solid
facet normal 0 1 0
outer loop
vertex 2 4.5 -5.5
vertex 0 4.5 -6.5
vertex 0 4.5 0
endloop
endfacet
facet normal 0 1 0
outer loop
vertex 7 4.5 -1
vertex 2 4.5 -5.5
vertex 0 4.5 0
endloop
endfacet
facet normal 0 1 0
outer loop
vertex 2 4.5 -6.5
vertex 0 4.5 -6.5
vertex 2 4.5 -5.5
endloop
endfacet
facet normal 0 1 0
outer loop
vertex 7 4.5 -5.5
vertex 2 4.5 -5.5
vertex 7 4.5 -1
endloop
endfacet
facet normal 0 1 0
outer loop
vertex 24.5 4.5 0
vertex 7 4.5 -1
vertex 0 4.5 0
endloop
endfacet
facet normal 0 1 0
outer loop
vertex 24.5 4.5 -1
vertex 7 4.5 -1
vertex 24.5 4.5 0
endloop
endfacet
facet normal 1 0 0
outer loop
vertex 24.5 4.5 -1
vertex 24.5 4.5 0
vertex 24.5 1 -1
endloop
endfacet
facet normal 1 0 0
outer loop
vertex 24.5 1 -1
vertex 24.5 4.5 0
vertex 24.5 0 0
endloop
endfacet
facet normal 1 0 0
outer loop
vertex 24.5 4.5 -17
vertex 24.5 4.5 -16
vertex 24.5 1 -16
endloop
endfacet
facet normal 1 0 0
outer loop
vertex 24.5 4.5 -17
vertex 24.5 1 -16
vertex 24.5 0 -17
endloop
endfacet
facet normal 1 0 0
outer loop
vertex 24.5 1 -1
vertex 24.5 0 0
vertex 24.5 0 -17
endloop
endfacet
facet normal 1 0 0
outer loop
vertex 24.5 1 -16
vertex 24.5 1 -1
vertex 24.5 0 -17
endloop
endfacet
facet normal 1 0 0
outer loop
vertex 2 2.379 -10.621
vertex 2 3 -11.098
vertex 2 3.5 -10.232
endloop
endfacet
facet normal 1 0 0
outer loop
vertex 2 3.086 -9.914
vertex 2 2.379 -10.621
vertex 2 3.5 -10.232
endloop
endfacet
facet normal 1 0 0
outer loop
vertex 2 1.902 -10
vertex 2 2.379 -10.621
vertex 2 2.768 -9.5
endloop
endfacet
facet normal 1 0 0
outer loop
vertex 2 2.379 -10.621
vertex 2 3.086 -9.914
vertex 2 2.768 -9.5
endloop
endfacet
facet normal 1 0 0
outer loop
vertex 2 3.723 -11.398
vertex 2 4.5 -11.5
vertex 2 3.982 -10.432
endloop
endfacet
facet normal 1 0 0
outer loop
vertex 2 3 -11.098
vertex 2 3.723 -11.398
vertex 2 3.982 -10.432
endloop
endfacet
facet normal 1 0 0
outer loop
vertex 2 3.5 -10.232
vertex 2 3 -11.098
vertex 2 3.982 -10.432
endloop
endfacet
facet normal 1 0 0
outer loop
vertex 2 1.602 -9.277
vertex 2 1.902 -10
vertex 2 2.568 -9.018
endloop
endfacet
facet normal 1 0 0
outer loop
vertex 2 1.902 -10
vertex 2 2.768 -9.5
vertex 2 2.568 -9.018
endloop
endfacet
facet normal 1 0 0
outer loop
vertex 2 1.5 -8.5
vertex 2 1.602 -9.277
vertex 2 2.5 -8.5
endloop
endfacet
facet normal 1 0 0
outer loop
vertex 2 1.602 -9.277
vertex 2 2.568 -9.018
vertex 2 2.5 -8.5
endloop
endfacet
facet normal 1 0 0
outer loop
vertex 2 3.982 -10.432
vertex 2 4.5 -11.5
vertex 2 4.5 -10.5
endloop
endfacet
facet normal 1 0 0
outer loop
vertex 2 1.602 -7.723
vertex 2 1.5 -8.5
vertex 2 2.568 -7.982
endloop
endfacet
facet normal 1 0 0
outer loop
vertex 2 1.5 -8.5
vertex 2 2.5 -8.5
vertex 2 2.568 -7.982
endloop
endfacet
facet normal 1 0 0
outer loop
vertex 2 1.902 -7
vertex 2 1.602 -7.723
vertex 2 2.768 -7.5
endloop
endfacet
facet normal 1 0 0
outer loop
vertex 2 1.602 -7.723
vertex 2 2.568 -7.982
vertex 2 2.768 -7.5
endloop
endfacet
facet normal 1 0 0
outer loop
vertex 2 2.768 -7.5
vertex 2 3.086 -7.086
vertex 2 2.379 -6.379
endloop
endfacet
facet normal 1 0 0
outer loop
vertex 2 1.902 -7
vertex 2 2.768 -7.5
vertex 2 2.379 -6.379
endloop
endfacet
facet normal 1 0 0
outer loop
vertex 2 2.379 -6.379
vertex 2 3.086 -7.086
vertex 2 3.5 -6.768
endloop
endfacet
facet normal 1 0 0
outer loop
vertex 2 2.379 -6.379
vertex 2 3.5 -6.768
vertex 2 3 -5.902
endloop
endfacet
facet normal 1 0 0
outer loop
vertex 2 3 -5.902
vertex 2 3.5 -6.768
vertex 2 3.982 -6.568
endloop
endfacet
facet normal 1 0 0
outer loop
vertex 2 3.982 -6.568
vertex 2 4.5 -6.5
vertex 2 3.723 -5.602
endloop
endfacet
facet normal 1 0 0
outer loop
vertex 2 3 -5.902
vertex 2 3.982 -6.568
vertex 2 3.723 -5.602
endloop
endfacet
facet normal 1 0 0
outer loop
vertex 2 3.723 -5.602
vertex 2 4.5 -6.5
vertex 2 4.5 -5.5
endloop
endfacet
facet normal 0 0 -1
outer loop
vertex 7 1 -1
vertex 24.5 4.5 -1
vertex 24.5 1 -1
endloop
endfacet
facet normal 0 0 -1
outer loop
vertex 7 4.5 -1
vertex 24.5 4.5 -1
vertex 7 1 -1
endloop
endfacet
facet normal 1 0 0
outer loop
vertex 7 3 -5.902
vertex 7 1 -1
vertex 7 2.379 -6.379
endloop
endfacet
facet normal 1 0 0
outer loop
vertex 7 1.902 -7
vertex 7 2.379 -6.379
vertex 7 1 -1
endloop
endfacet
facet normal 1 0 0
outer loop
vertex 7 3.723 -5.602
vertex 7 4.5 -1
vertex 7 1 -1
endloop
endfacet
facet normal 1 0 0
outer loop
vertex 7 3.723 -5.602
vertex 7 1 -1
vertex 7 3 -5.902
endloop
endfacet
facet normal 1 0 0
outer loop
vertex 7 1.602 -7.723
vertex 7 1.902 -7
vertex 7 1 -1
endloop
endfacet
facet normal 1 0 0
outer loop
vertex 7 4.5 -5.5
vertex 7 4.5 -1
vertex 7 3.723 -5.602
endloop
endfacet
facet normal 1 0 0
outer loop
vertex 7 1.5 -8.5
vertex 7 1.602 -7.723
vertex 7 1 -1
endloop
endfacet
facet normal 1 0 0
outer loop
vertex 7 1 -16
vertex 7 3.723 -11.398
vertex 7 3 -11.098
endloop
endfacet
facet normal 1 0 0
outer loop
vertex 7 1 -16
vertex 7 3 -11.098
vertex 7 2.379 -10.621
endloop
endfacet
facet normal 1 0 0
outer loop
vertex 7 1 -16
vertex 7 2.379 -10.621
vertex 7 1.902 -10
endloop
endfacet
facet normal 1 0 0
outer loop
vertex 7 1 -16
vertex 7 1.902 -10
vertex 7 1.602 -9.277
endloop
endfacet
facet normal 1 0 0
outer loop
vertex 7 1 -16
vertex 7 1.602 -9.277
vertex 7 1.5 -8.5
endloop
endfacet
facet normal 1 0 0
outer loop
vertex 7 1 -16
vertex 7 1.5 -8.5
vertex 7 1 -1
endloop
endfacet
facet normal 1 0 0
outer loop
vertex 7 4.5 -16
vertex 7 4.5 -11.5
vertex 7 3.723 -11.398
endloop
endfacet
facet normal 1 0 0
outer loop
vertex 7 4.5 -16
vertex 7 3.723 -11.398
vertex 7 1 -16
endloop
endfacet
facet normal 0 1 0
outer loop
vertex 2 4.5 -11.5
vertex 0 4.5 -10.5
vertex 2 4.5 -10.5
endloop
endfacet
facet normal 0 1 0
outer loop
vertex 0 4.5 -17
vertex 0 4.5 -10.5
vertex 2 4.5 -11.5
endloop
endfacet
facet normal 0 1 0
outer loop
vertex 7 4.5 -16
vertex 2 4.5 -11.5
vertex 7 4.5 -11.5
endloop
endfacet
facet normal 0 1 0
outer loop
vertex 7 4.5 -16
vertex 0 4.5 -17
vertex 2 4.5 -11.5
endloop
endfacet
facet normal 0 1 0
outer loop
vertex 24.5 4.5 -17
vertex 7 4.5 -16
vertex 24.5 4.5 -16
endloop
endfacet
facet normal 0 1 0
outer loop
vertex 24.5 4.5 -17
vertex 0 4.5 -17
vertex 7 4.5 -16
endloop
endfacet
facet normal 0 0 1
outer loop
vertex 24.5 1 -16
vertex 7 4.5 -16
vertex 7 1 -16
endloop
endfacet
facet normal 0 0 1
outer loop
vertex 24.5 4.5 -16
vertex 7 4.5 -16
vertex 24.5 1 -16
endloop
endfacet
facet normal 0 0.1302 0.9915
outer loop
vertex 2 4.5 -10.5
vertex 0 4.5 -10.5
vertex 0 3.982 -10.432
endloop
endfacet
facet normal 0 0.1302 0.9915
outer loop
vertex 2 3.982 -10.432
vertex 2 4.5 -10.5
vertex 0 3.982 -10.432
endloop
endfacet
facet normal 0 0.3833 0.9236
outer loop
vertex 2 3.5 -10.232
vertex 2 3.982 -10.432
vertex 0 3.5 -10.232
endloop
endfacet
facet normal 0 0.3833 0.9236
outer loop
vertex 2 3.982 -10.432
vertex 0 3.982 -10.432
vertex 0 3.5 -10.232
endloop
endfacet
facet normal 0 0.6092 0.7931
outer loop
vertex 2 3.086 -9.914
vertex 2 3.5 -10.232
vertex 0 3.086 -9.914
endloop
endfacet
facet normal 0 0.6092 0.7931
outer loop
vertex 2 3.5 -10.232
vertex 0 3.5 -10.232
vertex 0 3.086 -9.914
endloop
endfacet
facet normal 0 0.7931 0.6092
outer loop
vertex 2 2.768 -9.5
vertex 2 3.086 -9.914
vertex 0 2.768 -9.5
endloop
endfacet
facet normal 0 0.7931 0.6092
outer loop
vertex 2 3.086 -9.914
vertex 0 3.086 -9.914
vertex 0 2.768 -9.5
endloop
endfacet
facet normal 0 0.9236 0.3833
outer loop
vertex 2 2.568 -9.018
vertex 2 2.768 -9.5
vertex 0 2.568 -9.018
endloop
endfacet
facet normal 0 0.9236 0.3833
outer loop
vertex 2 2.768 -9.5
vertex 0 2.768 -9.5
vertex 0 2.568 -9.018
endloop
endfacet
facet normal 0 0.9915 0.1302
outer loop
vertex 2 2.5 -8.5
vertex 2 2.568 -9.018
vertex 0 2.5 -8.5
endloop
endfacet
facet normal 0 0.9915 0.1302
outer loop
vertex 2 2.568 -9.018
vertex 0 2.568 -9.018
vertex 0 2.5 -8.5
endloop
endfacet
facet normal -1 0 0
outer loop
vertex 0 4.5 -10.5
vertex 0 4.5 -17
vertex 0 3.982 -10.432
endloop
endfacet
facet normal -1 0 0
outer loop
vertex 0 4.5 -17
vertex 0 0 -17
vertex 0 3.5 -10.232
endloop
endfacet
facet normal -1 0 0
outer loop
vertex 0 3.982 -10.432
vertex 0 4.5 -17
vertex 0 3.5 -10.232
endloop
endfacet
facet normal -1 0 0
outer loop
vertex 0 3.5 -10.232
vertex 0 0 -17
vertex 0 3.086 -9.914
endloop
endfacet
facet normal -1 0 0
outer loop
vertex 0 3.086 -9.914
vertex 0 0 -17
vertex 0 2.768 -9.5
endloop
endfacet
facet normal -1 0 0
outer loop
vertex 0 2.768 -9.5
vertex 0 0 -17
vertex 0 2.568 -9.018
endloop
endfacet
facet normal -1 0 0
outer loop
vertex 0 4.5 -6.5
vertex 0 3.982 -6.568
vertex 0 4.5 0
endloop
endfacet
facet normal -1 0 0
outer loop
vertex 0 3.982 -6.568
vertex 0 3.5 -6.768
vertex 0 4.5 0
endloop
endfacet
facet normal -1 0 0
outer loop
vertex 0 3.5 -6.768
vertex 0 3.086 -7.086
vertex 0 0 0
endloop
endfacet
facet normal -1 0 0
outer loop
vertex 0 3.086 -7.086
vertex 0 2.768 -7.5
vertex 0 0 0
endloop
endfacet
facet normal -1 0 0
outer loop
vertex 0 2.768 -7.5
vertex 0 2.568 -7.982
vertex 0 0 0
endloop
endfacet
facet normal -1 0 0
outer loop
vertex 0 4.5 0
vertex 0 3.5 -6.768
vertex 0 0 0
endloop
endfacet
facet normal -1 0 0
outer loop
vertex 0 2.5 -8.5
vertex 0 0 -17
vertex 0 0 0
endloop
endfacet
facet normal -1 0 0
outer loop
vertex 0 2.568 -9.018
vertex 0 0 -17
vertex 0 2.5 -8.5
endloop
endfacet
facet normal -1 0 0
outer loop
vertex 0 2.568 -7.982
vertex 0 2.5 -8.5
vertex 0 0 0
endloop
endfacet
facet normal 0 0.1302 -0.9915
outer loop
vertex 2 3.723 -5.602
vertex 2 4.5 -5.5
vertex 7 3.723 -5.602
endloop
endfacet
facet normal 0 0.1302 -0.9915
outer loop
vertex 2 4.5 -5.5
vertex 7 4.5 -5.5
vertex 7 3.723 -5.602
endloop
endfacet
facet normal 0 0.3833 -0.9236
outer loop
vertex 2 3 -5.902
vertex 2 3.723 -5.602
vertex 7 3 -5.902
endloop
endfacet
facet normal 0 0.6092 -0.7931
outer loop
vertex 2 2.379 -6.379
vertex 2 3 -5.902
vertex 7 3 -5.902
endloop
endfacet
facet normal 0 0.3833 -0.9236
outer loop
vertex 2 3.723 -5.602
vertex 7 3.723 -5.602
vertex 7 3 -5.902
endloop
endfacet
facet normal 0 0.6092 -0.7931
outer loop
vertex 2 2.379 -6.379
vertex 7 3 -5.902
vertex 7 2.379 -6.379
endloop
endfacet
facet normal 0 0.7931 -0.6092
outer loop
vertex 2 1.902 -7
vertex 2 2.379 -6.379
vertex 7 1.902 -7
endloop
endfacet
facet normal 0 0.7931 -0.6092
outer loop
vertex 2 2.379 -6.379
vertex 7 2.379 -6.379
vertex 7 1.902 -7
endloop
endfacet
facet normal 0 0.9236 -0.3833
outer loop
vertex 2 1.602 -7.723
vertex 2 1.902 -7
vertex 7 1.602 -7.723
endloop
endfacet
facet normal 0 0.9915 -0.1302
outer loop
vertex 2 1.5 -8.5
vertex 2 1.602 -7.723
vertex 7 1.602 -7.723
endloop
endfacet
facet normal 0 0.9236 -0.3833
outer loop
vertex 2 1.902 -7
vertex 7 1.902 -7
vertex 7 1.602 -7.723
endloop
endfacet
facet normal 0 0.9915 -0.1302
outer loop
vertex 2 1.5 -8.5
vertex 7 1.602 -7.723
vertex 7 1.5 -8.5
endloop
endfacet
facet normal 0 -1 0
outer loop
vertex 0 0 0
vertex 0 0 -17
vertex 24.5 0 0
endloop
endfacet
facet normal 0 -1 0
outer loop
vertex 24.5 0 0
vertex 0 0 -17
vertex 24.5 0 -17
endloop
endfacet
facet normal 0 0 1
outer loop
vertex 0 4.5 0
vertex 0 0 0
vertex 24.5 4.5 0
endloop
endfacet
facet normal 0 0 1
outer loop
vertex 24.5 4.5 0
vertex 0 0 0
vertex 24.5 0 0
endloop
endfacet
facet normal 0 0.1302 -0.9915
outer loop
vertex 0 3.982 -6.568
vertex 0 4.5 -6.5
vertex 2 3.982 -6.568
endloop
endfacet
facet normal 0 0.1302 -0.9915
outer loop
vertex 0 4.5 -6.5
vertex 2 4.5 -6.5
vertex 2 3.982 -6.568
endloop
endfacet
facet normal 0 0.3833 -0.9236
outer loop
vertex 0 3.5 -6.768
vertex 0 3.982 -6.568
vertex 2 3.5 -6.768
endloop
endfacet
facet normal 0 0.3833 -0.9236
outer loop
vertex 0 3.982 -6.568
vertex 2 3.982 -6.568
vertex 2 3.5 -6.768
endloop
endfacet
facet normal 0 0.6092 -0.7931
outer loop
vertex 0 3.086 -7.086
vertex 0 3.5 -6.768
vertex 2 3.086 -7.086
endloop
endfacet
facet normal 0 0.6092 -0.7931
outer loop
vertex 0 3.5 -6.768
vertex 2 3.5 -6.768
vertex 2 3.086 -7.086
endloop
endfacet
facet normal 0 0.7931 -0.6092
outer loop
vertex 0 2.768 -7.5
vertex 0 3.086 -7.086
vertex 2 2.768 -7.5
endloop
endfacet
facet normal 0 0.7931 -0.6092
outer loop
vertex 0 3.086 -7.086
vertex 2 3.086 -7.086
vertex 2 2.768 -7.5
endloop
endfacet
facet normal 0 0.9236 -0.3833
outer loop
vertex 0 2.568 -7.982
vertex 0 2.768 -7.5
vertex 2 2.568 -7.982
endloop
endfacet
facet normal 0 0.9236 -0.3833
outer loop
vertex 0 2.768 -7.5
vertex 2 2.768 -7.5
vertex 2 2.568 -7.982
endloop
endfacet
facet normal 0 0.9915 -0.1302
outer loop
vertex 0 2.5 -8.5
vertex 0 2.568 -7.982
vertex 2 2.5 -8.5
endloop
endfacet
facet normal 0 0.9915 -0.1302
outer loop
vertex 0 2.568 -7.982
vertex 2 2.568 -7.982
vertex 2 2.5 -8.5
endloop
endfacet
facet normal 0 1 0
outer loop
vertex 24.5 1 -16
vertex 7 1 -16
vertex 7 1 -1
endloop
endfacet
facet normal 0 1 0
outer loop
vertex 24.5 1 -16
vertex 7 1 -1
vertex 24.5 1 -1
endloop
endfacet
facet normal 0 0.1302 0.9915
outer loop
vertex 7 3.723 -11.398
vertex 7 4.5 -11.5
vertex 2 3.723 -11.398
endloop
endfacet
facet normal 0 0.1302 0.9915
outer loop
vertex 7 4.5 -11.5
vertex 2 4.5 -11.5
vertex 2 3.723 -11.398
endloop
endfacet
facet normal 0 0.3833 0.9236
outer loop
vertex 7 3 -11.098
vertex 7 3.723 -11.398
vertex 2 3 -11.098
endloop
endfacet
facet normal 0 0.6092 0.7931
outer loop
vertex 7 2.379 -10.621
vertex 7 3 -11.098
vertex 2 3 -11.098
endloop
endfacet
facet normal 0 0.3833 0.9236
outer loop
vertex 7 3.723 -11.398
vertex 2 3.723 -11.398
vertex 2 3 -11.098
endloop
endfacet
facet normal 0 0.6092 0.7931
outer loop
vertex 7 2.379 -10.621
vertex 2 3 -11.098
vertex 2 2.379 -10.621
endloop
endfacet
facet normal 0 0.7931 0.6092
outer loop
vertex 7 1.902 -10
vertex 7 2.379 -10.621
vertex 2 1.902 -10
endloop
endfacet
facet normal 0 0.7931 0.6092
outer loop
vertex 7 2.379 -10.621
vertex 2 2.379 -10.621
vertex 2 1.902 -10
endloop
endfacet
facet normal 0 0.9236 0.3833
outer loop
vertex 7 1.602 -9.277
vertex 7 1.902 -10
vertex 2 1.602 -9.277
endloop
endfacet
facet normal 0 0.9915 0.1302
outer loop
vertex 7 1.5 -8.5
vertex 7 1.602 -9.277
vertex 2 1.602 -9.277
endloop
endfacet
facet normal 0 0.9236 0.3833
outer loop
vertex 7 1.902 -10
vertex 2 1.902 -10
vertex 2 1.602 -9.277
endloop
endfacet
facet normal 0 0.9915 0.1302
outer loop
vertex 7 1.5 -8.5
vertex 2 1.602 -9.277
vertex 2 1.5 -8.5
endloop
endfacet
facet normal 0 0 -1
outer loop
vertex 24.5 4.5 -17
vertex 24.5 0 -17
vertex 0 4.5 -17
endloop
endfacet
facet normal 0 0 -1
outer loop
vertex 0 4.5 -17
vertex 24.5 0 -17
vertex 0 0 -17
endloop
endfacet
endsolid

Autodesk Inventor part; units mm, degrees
ref_plane "YZ Plane" through (0, 0, 0) normal (1, 0, 0) x (0, 1, 0)
ref_plane "XZ Plane" through (0, 0, 0) normal (0, 1, 0) x (-1, 0, 0)
ref_plane "XY Plane" through (0, 0, 0) normal (0, 0, 1) x (1, 0, 0)
sketch "Эскиз24" plane through (0, 0, 0) normal (0, 1, 0) x (1, 0, 0)
  line L0 (0, 0) -> (24.5, 0)
  line L1 (24.5, 0) -> (24.5, 17)
  line L2 (24.5, 17) -> (0, 17)
  line L3 (0, 17) -> (0, 0)
  dimension "d124" = 24.5
  dimension "d125" = 17
extrude "Выдавливание17" add sketch "Эскиз24" along normal blind 4.5
sketch "Эскиз25" plane through (0, 4.5, 0) normal (0, 1, 0) x (1, 0, 0)
  line L0 (24.5, 1) -> (7, 1)
  line L1 (7, 1) -> (7, 16)
  line L2 (7, 16) -> (24.5, 16)
  line L3 (24.5, 16) -> (24.5, 1)
  line L4 (24.5, 0) -> (24.5, 17) projected
  line L5 (0, 17) -> (0, 0) projected
  point P0 (24.5, 8.5)
  dimension "d128" = 15
  dimension "d129" = 17.5
extrude "Выдавливание18" cut sketch "Эскиз25" against normal blind 3.5
sketch "Эскиз26" plane through (0, 4.5, 0) normal (0, 1, 0) x (1, 0, 0)
  line L0 (7, 1) -> (7, 16) projected
  line L1 (2, 5.5) -> (7, 5.5)
  line L2 (7, 5.5) -> (7, 11.5)
  line L3 (7, 11.5) -> (2, 11.5)
  line L4 (2, 11.5) -> (2, 5.5)
  line L5 (7, 1) -> (7, 16) projected
  point P0 (0, 0)
  point P1 (7, 8.5)
  dimension "d133" = 5
  dimension "d134" = 6
extrude "Выдавливание19" cut sketch "Эскиз26" against normal blind 3
fillet "Сопряжение8" radius 3 2 edges at (4.5, 1.5, -11.5) (4.5, 1.5, -5.5)
sketch "Эскиз27" plane through (0, 4.5, 0) normal (0, 1, 0) x (1, 0, 0)
  line L0 (0, 6.5) -> (2, 6.5)
  line L1 (2, 6.5) -> (2, 10.5)
  line L2 (2, 10.5) -> (0, 10.5)
  line L3 (0, 10.5) -> (0, 6.5)
  line L4 (2, 5.5) -> (2, 11.5) projected
  line L5 (0, 17) -> (0, 0) projected
  point P0 (2, 8.5)
  dimension "d138" = 4
extrude "Выдавливание20" cut sketch "Эскиз27" against normal blind 2
fillet "Сопряжение9" radius 2 2 edges at (1, 2.5, -10.5) (1, 2.5, -6.5)
sketch "Эскиз21" plane through (20, 0, 0.1742) normal (1, 0, 0) x (0, 0, -1)
  line L0 (0.1742, 0) -> (-5.0258, 0) projected
  line L1 (0.1742, 0) -> (0.1742, 25) projected
  line L2 (-5.0258, 0) -> (-8.7758, -17.85)
  line L3 (0.1742, 0) -> (-3.5758, -17.85)
  line L4 (-8.7758, -17.85) -> (-3.5758, -17.85)
  dimension "d103" = 17.85
  dimension "d104" = 8.95
sketch "Эскиз22" plane through (20, -17.85, 3.75) normal (0, -1, 0) x (1, 0, 0)
  line L0 (0, 0) -> (-9.1, 0)
  line L1 (-9.1, 0) -> (-9.1, 17.3)
  line L2 (-9.1, 17.3) -> (0, 17.3)
  line L3 (0, 17.3) -> (0, 0)
  line L4 (0, 5.2) -> (-9.1, 5.2) projected
  line L5 (0, 0) -> (-9.1, 0) projected
  line L6 (0, 5.2) -> (0, 0) projected
  line L7 (0, 0) -> (-9.1, 0) projected
  line L8 (-9.1, 0) -> (-9.1, 5.2) projected
  line L9 (0, 5.2) -> (-9.1, 5.2) projected
  point P0 (-20, -3.75)
  point P1 (0, -7.9181)
  point P2 (-9.1, -7.9181)
  point P3 (-9.1, 0)
  point P4 (-9.1, -7.9181)
  point P5 (0, -7.9181)
  point P6 (0, 0)
  point P7 (0, 4.1819)
  point P8 (-9.1, 4.1819)
  dimension "d122" = 12.1
sketch "Эскиз23" plane through (40.15, -13.85, 3.75) normal (0, 1, 0) x (1, 0, 0)
  line L0 (-9.1, -17.3) -> (0, -17.3) projected
  line L1 (-4.55, -17.3) -> (-4.55, -12.6)
  point P0 (-40.15, 3.75)
  dimension "d118" = 4.7
properties part number "Крепление ультрасоника заднее"
